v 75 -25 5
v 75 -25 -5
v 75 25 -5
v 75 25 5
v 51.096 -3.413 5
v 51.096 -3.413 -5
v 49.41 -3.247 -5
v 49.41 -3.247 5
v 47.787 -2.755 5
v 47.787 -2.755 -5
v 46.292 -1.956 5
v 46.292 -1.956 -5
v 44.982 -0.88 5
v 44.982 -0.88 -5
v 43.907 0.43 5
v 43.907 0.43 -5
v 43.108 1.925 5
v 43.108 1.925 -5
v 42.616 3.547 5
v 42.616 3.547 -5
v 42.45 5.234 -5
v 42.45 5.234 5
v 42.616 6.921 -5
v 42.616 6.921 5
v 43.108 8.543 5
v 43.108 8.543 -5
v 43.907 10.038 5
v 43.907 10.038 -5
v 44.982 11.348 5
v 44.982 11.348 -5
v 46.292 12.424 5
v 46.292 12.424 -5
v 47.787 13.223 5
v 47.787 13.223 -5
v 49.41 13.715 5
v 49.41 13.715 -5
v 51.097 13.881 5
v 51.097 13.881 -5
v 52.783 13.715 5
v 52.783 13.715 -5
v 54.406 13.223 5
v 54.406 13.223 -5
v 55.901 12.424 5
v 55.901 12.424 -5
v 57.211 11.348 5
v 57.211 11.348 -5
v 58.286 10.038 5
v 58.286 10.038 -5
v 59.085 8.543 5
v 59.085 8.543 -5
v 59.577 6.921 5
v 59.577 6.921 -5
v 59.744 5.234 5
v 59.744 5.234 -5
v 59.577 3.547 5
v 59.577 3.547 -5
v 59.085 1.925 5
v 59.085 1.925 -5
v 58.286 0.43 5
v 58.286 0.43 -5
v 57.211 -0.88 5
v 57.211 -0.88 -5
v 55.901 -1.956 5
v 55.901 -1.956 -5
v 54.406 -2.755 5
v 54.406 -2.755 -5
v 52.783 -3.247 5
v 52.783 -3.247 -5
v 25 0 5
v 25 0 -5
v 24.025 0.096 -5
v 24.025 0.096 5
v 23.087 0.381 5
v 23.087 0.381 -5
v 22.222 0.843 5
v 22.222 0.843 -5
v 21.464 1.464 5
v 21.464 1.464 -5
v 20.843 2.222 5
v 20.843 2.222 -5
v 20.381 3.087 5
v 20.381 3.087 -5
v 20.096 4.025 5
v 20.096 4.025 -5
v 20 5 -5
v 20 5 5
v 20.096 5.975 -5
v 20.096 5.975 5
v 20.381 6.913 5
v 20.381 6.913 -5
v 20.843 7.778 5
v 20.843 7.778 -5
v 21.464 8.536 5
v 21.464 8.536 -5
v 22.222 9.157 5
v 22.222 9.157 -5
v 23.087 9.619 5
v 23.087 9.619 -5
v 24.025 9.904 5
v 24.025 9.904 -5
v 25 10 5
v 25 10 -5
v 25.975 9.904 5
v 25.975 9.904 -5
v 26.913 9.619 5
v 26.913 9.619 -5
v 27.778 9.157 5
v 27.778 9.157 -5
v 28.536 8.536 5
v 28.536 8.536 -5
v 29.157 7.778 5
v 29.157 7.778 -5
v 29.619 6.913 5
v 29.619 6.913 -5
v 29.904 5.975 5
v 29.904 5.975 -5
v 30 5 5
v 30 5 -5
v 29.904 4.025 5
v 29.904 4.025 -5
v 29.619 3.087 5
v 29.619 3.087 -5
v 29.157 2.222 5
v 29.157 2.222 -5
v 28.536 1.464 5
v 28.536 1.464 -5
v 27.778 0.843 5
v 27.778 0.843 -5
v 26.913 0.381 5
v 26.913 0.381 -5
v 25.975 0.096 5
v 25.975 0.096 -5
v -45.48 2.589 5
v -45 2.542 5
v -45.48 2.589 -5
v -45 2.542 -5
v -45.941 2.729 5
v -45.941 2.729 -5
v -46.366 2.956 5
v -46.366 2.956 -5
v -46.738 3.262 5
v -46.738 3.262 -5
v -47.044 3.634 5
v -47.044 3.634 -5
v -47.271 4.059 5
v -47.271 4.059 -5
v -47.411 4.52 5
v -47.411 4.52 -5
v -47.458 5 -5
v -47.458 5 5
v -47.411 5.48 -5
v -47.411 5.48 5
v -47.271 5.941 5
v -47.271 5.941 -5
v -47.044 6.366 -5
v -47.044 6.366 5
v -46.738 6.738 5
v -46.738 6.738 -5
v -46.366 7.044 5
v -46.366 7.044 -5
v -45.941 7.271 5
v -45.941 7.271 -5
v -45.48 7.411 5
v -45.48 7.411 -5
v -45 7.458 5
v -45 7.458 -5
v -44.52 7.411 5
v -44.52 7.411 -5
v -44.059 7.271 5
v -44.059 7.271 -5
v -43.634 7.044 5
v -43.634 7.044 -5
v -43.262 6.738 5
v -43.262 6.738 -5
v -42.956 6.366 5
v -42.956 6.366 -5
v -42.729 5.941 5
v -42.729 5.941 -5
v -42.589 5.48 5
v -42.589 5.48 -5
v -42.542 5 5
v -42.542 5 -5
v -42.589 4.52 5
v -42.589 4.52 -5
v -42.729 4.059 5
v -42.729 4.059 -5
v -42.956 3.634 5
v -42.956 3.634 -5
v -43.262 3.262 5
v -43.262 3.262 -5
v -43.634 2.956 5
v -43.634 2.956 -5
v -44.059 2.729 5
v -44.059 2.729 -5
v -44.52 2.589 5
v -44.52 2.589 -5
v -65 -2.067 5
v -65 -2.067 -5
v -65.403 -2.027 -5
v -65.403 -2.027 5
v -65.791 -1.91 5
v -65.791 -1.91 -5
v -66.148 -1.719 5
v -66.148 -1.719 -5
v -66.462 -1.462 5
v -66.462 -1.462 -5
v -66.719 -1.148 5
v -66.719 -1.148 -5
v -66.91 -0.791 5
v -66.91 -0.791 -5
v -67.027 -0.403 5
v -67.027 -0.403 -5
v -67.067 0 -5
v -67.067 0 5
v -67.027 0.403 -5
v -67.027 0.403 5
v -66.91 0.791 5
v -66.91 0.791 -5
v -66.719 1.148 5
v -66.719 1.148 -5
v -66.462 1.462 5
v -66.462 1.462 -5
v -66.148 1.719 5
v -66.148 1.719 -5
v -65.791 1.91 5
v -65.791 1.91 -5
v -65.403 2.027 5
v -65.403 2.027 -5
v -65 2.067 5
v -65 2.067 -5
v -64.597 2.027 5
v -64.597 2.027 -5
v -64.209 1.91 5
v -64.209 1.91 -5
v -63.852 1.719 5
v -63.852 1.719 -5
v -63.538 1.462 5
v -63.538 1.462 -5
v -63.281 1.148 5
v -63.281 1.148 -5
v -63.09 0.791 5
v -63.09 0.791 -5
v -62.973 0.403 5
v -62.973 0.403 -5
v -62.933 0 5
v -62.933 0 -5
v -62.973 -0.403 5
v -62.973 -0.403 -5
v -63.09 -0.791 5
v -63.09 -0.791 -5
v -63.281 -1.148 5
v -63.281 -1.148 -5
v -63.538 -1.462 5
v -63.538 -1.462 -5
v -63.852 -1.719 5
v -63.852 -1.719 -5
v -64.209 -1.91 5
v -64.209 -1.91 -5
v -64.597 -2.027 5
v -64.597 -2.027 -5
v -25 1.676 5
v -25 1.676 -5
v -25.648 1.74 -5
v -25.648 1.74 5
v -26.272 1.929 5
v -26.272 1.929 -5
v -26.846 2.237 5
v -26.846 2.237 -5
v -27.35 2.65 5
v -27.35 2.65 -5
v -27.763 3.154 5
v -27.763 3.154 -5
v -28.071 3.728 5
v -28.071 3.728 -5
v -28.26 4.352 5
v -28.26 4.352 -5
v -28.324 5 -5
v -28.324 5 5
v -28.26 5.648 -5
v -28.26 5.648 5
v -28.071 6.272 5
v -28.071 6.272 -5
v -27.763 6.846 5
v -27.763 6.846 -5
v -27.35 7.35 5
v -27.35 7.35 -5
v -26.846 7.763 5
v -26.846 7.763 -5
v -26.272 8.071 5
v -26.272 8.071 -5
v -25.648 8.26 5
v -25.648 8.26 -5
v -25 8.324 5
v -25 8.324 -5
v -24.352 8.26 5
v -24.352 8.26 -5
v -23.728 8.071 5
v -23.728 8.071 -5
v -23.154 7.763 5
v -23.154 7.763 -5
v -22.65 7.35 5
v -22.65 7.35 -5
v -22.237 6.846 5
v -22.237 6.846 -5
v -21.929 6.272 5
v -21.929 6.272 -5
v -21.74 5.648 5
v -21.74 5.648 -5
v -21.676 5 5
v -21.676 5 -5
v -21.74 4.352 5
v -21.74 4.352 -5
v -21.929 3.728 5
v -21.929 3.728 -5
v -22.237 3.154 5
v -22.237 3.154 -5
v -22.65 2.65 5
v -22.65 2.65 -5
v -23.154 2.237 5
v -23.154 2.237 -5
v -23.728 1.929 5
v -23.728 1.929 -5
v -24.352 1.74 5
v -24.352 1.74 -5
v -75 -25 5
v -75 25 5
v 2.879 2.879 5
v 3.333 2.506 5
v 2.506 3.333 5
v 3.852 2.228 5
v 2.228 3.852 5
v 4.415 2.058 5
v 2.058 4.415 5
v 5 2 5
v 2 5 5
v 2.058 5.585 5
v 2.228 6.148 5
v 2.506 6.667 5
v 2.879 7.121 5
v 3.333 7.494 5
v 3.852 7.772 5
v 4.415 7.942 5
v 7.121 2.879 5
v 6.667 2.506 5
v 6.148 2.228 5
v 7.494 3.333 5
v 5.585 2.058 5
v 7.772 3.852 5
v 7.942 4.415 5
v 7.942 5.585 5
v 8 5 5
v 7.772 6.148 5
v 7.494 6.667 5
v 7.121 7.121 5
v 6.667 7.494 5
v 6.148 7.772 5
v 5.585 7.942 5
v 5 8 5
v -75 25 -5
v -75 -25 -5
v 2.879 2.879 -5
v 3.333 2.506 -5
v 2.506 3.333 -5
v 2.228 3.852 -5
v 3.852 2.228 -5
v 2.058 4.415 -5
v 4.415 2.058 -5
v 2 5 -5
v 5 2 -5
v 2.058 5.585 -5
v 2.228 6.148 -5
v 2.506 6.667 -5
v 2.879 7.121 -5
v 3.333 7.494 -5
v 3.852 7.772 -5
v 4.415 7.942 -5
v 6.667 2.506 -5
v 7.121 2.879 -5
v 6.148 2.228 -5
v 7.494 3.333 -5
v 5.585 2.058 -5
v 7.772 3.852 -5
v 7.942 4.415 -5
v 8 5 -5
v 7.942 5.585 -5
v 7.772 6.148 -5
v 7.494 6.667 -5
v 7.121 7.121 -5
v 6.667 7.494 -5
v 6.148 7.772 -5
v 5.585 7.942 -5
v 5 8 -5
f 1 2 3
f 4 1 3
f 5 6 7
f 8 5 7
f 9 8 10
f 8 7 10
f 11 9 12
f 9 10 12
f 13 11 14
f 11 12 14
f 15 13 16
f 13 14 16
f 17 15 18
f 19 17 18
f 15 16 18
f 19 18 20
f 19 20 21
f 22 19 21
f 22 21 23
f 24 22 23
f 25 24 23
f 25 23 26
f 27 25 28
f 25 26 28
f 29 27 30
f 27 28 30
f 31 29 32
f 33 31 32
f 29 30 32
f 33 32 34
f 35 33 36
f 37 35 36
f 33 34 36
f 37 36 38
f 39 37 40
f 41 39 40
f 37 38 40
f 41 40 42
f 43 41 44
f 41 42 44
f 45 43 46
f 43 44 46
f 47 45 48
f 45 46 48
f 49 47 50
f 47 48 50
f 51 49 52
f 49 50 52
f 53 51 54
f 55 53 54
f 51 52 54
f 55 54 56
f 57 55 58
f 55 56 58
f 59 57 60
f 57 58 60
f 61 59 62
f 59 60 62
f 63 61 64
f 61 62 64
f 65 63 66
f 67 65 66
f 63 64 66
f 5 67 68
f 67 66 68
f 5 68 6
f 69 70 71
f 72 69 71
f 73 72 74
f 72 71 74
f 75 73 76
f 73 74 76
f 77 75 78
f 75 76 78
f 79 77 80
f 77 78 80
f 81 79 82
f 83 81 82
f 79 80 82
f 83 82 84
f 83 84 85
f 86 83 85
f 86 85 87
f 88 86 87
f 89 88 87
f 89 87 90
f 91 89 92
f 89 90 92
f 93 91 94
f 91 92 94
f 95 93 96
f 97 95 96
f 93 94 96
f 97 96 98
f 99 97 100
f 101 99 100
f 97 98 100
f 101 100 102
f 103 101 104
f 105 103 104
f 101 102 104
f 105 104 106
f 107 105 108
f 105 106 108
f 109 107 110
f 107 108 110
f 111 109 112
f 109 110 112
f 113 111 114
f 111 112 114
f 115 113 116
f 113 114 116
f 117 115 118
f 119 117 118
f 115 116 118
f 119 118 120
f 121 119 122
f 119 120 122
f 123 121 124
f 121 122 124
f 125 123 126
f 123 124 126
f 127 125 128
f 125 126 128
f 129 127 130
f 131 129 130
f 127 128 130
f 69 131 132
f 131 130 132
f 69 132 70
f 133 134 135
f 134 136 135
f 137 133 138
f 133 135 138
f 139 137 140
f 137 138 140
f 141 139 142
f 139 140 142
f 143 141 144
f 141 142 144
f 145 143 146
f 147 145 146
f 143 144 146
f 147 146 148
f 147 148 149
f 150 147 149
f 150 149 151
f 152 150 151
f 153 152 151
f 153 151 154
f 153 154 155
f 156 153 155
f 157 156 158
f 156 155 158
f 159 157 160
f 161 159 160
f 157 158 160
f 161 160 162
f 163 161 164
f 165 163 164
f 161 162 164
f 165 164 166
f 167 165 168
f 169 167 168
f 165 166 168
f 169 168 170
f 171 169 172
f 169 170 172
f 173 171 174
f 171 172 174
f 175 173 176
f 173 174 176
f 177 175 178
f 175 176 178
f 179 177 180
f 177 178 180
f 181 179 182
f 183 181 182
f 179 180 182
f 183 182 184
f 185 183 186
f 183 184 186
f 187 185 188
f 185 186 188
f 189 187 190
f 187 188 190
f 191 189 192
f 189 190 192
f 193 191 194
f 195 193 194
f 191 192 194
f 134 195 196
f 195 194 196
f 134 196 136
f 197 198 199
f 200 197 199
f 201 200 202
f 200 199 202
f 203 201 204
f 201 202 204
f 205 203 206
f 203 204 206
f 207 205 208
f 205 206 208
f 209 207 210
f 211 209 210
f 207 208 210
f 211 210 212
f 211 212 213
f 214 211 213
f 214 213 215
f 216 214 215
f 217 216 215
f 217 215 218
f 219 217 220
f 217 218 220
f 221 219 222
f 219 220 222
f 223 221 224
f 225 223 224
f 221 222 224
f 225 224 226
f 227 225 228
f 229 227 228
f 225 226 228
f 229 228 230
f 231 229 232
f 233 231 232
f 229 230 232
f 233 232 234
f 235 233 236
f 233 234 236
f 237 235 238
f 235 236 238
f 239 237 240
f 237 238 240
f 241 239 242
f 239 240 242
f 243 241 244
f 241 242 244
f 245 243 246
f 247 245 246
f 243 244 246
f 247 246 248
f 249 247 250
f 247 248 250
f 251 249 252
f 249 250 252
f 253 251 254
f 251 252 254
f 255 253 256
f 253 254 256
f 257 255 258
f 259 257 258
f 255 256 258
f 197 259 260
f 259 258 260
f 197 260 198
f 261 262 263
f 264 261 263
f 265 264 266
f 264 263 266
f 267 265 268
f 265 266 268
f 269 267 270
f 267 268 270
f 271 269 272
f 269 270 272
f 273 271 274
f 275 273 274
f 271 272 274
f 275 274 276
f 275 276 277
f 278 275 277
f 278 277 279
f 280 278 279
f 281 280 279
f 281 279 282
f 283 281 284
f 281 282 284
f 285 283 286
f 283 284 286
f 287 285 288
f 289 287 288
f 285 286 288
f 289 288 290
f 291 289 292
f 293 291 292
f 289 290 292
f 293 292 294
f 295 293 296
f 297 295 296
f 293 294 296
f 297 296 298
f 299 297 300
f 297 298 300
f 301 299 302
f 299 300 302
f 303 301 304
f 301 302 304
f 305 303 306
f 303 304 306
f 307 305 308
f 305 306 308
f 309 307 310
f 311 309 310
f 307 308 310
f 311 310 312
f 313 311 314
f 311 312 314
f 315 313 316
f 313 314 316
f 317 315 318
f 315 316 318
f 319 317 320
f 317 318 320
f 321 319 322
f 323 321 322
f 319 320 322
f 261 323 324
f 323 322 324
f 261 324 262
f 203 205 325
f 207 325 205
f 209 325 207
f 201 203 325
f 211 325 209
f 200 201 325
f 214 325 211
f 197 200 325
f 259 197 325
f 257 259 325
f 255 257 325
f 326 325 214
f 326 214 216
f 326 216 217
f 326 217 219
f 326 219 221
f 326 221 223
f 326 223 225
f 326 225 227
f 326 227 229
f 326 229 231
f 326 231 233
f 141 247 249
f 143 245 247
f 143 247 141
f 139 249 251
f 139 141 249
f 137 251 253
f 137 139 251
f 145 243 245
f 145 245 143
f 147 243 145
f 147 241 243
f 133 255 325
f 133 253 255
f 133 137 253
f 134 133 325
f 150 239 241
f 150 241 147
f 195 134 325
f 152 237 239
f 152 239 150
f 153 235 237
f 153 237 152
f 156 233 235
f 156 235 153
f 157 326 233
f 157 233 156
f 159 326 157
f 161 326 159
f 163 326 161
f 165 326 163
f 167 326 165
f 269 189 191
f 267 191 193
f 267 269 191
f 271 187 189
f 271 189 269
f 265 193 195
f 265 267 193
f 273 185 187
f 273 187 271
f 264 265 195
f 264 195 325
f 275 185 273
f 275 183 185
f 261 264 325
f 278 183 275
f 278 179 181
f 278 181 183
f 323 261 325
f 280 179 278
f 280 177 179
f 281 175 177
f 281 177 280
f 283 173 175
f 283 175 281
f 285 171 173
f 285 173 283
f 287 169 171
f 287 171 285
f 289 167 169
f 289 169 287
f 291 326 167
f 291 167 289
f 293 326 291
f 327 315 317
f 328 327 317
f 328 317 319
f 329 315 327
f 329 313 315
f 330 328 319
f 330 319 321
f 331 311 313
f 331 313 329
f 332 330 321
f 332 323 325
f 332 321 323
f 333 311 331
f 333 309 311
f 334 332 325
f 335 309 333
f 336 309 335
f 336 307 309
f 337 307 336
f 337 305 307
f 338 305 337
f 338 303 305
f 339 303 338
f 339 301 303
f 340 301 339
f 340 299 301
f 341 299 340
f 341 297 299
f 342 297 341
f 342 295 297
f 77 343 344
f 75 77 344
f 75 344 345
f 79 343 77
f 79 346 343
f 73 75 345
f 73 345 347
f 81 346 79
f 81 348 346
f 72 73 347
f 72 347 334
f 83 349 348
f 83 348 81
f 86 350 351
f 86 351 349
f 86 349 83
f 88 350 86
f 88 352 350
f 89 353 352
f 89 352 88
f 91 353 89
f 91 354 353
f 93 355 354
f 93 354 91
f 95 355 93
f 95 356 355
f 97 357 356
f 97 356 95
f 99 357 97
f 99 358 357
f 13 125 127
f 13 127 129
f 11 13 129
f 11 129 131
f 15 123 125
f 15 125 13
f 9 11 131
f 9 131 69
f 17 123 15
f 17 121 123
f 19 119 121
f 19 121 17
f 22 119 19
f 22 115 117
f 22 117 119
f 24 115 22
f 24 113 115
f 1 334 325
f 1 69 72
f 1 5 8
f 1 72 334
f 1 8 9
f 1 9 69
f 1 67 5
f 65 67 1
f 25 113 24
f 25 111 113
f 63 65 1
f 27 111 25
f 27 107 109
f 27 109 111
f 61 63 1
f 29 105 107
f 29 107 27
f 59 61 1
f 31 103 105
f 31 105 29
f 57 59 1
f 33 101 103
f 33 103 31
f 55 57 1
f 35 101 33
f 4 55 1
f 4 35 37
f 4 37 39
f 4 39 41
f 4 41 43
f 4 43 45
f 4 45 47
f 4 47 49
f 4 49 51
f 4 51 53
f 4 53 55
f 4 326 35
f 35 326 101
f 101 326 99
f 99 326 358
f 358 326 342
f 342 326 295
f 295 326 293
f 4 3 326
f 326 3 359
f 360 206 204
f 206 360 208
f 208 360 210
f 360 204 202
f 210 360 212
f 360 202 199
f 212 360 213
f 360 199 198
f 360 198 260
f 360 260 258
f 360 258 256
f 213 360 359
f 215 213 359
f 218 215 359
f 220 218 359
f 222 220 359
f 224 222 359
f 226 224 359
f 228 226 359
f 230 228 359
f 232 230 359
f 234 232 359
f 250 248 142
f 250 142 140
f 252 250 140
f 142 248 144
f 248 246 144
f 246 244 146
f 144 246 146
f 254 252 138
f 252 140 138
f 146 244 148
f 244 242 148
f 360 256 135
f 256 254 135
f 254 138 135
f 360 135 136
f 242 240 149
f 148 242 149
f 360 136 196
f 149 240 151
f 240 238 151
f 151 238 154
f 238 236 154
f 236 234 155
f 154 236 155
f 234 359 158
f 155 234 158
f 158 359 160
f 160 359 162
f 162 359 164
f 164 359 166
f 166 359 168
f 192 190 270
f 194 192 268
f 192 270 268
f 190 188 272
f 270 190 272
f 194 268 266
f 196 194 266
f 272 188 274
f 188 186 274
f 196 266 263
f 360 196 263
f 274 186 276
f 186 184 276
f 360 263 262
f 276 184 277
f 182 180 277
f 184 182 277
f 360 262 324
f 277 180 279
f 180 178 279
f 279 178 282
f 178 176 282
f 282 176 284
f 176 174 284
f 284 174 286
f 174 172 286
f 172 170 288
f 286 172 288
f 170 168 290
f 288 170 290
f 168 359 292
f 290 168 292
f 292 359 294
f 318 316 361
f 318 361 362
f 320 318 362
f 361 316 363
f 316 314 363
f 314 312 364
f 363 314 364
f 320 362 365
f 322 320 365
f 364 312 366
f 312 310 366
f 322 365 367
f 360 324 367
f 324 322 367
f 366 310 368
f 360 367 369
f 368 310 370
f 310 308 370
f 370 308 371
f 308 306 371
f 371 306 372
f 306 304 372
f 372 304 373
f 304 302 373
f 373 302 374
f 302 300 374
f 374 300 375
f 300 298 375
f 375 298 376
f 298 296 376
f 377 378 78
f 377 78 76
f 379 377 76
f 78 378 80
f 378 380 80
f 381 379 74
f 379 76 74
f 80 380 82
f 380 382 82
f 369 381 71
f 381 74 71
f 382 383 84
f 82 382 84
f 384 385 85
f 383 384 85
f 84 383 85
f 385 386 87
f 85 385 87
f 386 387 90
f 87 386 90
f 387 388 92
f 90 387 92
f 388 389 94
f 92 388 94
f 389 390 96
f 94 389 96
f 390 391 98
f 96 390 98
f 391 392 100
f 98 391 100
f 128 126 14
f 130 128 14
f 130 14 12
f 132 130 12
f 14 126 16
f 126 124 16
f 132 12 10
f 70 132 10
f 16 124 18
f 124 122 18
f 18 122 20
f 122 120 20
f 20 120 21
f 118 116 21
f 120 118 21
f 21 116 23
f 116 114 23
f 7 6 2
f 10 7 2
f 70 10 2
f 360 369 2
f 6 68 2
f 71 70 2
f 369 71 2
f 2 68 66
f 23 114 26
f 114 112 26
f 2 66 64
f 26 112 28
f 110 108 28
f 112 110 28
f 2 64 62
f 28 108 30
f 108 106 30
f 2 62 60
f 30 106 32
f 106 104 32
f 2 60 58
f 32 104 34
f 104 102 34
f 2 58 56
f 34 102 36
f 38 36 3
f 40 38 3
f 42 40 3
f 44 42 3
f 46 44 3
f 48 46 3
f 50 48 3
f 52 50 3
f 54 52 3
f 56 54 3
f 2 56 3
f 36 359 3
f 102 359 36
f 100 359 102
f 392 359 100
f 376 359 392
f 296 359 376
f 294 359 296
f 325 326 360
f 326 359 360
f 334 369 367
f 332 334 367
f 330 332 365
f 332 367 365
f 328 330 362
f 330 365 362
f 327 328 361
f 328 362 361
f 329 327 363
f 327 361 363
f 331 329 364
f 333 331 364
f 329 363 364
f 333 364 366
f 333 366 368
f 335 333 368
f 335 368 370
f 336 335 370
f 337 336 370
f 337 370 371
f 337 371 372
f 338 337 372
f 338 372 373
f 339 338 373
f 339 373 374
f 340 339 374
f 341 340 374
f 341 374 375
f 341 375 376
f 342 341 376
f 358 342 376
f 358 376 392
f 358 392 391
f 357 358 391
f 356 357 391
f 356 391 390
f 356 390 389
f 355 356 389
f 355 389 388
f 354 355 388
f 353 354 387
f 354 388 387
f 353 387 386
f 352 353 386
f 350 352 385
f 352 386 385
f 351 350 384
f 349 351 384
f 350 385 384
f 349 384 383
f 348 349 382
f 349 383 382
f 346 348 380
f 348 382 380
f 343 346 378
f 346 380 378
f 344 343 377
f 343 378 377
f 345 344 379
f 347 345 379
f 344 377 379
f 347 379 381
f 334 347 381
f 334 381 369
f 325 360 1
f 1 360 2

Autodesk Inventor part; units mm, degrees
ref_plane "YZ Plane" through (0, 0, 0) normal (1, 0, 0) x (0, 1, 0)
ref_plane "XZ Plane" through (0, 0, 0) normal (0, 1, 0) x (-1, 0, 0)
ref_plane "XY Plane" through (0, 0, 0) normal (0, 0, 1) x (1, 0, 0)
sketch "Sketch2" plane through (0, 0, 0) normal (0, 0, 1) x (1, 0, 0)
  line L0 (-75, -25) -> (75, -25)
  line L1 (75, -25) -> (75, 25)
  line L2 (75, 25) -> (-75, 25)
  line L3 (-75, 25) -> (-75, -25)
  line L4 (-75, -25) -> (75, 25) construction
  line L5 (75, -25) -> (-75, 25) construction
  point P0 (0, 0)
  dimension "d1" = 150
  dimension "d2" = 50
extrude "Extrusion1" add sketch "Sketch2" along normal mid plane 10
sketch "Sketch3" plane through (0, 0, 5) normal (0, 0, 1) x (1, 0, 0)
  line L0 (-75, 25) -> (-75, -25) projected
  line L1 (75, 25) -> (-75, 25) projected
  point P0 (0, 0)
  point P1 (-65, 0)
  dimension "d40" = 10
  dimension "d43" = 25
hole "Hole1" at (-65, 0, 5) direction (0, 0, -1) diameter 4.134 depth 14.2 tip angle 118 thread size "M5x0.8" class "6H" standard "TS profile"
sketch "Sketch4" plane through (0, 0, 5) normal (0, 0, 1) x (1, 0, 0)
  line L0 (-75, 25) -> (-75, -25) projected
  line L1 (75, 25) -> (-75, 25) projected
  point P0 (0, 0)
  point P1 (-45, 5)
  dimension "d41" = 30
  dimension "d42" = 20
hole "Hole2" at (-45, 5, 5) direction (0, 0, -1) diameter 4.917 depth 17.1 tip angle 118 thread size "M6x1" class "6H" standard "TS profile"
sketch "Sketch5" plane through (0, 0, 5) normal (0, 0, 1) x (1, 0, 0)
  line L0 (-75, 25) -> (-75, -25) projected
  line L1 (75, 25) -> (-75, 25) projected
  point P0 (0, 0)
  point P1 (-25, 5)
  dimension "d44" = 50
  dimension "d45" = 20
hole "Hole3" at (-25, 5, 5) direction (0, 0, -1) diameter 6.647 depth 22.2 tip angle 118 thread size "M8x1.25" class "6H" standard "TS profile"
sketch "Sketch6" plane through (0, 0, 5) normal (0, 0, 1) x (1, 0, 0)
  line L0 (-75, 25) -> (-75, -25) projected
  line L1 (75, 25) -> (-75, 25) projected
  point P0 (0, 0)
  point P1 (5, 5)
  dimension "d46" = 80
  dimension "d47" = 20
hole "Hole4" at (5, 5, 5) direction (0, 0, -1) diameter 6 depth 14.2 tip angle 118
sketch "Sketch7" plane through (0, 0, 5) normal (0, 0, 1) x (1, 0, 0)
  line L0 (-75, 25) -> (-75, -25) projected
  line L1 (75, 25) -> (-75, 25) projected
  point P0 (0, 0)
  point P1 (25, 5)
  dimension "d48" = 100
  dimension "d49" = 20
hole "Hole5" at (25, 5, 5) direction (0, 0, -1) diameter 10 depth 14.2 tip angle 118
sketch "Sketch8" plane through (0, 0, 5) normal (0, 0, 1) x (1, 0, 0)
  point P0 (0, 0)
  point P1 (51.0965, 5.234)
hole "Hole6" at (51.0965, 5.234, 5) direction (0, 0, -1) diameter 17.294 depth 51.2 tip angle 118 thread size "M20x2.5" class "6H" standard "TS profile"
properties part number "홀간 거리 확인 파트-2" material "SS400"
